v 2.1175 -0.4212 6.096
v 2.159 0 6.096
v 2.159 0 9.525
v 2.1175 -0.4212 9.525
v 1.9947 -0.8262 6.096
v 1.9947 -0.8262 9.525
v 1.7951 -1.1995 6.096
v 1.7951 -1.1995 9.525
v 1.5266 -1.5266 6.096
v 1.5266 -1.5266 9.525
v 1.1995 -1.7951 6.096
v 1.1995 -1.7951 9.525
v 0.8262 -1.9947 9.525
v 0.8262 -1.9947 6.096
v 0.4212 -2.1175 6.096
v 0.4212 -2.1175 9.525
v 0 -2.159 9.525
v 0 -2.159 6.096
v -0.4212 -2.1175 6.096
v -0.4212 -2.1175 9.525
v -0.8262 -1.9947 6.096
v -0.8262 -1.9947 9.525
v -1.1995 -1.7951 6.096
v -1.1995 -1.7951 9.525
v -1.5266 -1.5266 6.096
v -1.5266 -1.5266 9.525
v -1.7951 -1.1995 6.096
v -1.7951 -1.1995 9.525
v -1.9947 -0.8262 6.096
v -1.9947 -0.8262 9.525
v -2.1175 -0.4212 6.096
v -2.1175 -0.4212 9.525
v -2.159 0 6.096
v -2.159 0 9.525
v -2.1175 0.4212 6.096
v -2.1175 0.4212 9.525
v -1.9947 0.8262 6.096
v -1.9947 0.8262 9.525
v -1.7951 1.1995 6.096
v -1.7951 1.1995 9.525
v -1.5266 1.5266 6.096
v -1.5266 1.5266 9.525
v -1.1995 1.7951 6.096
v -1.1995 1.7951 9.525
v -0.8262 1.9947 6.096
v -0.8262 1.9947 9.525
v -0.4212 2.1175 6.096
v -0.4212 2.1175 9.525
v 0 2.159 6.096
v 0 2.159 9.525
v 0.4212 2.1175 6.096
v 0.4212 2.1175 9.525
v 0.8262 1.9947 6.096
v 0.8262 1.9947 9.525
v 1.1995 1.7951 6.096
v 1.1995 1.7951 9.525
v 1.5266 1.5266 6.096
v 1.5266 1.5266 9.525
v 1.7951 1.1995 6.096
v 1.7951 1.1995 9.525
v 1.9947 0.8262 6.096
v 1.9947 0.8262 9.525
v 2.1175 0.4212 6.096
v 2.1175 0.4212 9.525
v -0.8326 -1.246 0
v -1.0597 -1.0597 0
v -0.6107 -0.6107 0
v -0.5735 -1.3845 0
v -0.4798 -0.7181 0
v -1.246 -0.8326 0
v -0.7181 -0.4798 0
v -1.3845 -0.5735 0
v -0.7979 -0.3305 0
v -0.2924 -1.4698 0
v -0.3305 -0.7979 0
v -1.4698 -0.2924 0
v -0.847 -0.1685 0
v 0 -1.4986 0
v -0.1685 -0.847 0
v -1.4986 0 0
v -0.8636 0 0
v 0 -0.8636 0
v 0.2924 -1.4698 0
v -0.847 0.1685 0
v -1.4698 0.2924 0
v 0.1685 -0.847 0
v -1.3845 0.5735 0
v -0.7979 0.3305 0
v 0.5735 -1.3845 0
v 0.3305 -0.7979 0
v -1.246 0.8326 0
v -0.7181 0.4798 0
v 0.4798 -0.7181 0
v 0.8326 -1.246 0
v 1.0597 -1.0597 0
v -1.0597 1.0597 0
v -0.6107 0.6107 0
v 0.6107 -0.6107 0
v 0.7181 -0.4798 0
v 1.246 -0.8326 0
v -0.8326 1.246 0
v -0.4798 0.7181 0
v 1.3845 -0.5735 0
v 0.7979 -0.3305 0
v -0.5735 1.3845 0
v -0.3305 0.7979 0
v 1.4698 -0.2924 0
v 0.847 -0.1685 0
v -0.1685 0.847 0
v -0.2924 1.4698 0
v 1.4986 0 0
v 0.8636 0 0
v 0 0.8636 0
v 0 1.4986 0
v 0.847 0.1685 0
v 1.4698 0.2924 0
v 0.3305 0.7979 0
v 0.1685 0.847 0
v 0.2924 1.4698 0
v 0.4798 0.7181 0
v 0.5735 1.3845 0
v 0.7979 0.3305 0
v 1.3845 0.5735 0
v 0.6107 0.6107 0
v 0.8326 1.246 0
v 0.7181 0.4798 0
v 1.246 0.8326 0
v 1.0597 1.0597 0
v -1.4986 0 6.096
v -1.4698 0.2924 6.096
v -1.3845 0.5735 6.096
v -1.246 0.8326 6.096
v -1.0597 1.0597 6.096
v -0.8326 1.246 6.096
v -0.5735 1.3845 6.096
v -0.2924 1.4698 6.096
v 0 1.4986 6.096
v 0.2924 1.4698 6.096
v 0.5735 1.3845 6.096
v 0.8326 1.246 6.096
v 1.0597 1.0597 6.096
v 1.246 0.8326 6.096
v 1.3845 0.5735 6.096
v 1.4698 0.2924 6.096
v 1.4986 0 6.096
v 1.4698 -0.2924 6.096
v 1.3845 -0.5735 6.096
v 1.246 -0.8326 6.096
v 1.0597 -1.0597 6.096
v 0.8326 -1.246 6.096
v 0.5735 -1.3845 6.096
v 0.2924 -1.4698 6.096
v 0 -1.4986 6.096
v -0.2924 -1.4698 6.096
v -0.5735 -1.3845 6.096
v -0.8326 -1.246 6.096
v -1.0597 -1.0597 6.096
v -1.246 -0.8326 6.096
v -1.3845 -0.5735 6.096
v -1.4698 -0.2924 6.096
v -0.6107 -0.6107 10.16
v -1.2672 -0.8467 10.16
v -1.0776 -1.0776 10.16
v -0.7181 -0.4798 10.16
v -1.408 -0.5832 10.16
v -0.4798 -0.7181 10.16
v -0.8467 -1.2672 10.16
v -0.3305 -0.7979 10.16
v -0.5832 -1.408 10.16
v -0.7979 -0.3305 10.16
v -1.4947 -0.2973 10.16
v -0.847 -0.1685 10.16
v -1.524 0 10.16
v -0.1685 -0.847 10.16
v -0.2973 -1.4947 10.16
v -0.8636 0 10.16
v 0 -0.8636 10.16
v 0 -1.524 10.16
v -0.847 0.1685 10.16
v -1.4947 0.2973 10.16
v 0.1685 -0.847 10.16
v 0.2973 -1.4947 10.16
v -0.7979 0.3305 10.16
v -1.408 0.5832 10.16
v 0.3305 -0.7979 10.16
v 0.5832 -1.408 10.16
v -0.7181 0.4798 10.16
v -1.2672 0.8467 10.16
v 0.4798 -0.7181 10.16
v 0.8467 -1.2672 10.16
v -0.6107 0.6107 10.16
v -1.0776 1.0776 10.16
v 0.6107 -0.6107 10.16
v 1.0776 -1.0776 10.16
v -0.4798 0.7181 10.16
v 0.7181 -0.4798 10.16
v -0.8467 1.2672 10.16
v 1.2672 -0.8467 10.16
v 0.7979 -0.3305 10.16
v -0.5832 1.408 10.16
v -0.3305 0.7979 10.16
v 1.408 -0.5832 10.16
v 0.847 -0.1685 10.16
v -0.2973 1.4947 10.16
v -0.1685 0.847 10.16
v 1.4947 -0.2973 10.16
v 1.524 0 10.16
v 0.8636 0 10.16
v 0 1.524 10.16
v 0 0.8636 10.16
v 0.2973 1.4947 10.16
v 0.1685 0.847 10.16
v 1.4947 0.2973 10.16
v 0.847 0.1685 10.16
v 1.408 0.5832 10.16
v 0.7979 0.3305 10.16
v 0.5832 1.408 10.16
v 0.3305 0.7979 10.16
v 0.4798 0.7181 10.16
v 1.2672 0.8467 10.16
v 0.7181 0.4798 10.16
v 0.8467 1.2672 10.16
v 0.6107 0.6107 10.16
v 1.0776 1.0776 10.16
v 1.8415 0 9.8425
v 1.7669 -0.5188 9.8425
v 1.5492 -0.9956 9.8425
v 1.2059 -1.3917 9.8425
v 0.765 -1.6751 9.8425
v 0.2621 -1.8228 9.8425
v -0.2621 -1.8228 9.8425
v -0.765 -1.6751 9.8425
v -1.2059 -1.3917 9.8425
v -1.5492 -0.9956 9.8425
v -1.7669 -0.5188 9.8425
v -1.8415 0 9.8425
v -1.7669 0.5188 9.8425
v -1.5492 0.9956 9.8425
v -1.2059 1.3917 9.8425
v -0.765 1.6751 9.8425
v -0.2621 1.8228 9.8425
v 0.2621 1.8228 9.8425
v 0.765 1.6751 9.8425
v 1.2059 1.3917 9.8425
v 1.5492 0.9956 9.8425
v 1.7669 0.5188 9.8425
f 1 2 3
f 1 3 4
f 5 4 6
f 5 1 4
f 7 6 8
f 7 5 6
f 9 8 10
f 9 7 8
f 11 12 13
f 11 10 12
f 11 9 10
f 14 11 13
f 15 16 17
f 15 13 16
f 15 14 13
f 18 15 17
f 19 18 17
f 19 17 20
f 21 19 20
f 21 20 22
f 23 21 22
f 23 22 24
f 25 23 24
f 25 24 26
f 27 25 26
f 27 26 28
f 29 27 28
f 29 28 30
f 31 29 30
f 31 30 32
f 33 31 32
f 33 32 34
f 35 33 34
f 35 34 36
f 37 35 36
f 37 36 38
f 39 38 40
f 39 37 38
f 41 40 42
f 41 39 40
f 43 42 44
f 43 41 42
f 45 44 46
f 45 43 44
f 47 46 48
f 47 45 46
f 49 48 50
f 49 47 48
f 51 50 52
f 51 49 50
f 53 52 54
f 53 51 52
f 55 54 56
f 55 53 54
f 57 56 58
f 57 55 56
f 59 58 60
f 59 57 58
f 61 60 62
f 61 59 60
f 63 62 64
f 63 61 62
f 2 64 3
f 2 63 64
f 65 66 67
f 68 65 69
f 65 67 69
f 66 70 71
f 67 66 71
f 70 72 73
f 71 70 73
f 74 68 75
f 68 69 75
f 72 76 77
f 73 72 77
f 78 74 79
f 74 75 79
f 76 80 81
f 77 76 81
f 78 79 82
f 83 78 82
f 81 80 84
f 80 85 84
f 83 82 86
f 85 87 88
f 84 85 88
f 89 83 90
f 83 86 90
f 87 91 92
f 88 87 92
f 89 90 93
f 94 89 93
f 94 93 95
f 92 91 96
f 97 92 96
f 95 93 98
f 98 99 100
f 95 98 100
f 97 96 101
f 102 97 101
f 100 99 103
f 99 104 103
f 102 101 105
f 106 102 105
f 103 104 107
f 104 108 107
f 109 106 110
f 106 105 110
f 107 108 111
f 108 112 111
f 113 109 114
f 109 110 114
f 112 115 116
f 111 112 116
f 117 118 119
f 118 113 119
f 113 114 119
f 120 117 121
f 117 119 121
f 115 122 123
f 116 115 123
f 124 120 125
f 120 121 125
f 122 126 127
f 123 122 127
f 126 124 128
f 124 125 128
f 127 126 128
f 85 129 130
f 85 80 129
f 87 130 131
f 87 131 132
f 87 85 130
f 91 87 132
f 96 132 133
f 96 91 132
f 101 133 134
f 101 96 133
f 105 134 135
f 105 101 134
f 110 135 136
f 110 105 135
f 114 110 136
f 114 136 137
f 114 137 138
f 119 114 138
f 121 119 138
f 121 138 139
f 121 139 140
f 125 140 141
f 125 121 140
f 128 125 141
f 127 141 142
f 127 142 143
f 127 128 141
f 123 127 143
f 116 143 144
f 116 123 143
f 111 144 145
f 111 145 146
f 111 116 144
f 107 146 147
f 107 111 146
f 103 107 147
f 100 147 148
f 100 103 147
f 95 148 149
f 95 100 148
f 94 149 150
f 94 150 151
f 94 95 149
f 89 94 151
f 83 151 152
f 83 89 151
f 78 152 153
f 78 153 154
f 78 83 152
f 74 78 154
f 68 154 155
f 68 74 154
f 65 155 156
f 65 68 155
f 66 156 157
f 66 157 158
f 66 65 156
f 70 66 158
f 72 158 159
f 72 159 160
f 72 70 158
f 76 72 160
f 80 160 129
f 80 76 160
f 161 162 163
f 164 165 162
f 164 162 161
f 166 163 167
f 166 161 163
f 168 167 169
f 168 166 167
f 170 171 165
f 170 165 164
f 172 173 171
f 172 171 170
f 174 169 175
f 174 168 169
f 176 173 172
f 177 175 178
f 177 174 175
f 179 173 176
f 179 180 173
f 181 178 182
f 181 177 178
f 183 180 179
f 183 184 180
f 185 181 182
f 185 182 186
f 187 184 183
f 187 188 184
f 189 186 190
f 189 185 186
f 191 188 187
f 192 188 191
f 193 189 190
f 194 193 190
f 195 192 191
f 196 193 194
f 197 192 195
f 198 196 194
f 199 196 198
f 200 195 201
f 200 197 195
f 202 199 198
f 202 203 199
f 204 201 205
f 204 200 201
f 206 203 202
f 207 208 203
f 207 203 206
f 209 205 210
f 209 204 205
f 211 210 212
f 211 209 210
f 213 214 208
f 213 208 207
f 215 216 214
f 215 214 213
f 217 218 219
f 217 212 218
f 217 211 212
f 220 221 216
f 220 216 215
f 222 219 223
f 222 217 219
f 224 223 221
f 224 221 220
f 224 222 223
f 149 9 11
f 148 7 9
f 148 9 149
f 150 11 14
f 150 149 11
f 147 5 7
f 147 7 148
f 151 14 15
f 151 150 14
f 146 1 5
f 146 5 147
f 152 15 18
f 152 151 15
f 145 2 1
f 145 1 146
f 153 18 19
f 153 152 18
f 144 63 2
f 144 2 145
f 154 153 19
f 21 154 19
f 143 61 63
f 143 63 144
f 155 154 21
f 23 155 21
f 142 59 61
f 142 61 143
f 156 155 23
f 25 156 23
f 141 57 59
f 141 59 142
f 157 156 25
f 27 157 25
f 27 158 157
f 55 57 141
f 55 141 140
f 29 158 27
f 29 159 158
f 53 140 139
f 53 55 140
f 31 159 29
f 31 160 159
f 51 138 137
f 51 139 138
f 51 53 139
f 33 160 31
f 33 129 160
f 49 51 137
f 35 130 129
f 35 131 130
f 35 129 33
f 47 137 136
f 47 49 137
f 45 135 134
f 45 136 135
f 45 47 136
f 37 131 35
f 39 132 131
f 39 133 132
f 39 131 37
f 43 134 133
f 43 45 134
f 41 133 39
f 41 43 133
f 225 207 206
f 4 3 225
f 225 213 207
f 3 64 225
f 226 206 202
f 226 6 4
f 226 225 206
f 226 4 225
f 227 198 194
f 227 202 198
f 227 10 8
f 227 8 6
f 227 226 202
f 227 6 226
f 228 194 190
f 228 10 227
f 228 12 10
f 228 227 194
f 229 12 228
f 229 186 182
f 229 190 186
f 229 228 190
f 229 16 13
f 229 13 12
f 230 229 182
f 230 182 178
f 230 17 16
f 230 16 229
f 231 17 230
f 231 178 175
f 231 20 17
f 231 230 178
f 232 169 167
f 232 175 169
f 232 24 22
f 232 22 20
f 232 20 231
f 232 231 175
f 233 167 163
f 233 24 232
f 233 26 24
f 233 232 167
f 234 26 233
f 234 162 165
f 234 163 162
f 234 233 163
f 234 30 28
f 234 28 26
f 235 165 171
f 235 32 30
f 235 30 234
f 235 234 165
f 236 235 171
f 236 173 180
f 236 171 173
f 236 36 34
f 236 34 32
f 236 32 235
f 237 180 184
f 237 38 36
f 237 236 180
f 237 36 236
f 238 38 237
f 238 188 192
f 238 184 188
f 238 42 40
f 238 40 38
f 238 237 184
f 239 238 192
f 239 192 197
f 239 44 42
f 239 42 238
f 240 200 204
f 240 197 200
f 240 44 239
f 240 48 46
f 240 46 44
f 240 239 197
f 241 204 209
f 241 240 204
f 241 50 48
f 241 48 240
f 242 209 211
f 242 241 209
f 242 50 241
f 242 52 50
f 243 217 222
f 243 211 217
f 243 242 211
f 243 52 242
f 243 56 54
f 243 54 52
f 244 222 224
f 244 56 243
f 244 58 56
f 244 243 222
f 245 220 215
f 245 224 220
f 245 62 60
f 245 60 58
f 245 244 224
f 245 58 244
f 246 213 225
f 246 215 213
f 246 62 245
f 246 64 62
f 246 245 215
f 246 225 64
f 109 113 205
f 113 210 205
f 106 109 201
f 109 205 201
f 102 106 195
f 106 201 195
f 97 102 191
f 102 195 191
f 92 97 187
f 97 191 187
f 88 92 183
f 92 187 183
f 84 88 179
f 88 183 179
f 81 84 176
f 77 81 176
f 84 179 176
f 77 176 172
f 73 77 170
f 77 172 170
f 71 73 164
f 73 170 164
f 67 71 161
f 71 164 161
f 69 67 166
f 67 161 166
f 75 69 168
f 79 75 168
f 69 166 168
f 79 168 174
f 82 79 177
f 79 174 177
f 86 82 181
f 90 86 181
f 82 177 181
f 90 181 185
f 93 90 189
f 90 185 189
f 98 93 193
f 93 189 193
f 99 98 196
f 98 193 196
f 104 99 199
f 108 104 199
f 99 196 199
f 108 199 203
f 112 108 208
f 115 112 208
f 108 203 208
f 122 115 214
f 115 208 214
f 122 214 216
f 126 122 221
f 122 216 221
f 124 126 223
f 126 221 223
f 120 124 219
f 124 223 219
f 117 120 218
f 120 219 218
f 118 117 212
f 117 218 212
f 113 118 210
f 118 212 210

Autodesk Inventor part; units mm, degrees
ref_plane "YZ Plane" through (0, 0, 0) normal (1, 0, 0) x (0, 1, 0)
ref_plane "XZ Plane" through (0, 0, 0) normal (0, 1, 0) x (-1, 0, 0)
ref_plane "XY Plane" through (0, 0, 0) normal (0, 0, 1) x (1, 0, 0)
sketch "Sketch1" plane through (0, 0, 0) normal (0, 0, 1) x (1, 0, 0)
  circle A0 centre (0, 0) radius 2.159
  dimension "d0" = 4.318
extrude "Extrusion1" add sketch "Sketch1" along normal blind 10.16
sketch "Sketch2" plane through (0, 0, 0) normal (0, 0, -1) x (-1, 0, 0)
  circle A0 centre (0, 0) radius 2.159 projected
  circle A1 centre (0, 0) radius 1.4986
  dimension "d3" = 2.9972
extrude "Extrusion2" cut sketch "Sketch2" against normal blind 6.096
sketch "Sketch3" plane through (0, 0, 0) normal (0, 0, -1) x (-1, 0, 0)
  circle A0 centre (0, 0) radius 1.4986 projected
hole "Hole1" at (0, 0, 0) direction (0, 0, 1) diameter 1.7272 end through all
chamfer "Chamfer1" distance 0.635 angle 45 1 edges at (-2.159, 0, 10.16)
properties part number "Connector"
